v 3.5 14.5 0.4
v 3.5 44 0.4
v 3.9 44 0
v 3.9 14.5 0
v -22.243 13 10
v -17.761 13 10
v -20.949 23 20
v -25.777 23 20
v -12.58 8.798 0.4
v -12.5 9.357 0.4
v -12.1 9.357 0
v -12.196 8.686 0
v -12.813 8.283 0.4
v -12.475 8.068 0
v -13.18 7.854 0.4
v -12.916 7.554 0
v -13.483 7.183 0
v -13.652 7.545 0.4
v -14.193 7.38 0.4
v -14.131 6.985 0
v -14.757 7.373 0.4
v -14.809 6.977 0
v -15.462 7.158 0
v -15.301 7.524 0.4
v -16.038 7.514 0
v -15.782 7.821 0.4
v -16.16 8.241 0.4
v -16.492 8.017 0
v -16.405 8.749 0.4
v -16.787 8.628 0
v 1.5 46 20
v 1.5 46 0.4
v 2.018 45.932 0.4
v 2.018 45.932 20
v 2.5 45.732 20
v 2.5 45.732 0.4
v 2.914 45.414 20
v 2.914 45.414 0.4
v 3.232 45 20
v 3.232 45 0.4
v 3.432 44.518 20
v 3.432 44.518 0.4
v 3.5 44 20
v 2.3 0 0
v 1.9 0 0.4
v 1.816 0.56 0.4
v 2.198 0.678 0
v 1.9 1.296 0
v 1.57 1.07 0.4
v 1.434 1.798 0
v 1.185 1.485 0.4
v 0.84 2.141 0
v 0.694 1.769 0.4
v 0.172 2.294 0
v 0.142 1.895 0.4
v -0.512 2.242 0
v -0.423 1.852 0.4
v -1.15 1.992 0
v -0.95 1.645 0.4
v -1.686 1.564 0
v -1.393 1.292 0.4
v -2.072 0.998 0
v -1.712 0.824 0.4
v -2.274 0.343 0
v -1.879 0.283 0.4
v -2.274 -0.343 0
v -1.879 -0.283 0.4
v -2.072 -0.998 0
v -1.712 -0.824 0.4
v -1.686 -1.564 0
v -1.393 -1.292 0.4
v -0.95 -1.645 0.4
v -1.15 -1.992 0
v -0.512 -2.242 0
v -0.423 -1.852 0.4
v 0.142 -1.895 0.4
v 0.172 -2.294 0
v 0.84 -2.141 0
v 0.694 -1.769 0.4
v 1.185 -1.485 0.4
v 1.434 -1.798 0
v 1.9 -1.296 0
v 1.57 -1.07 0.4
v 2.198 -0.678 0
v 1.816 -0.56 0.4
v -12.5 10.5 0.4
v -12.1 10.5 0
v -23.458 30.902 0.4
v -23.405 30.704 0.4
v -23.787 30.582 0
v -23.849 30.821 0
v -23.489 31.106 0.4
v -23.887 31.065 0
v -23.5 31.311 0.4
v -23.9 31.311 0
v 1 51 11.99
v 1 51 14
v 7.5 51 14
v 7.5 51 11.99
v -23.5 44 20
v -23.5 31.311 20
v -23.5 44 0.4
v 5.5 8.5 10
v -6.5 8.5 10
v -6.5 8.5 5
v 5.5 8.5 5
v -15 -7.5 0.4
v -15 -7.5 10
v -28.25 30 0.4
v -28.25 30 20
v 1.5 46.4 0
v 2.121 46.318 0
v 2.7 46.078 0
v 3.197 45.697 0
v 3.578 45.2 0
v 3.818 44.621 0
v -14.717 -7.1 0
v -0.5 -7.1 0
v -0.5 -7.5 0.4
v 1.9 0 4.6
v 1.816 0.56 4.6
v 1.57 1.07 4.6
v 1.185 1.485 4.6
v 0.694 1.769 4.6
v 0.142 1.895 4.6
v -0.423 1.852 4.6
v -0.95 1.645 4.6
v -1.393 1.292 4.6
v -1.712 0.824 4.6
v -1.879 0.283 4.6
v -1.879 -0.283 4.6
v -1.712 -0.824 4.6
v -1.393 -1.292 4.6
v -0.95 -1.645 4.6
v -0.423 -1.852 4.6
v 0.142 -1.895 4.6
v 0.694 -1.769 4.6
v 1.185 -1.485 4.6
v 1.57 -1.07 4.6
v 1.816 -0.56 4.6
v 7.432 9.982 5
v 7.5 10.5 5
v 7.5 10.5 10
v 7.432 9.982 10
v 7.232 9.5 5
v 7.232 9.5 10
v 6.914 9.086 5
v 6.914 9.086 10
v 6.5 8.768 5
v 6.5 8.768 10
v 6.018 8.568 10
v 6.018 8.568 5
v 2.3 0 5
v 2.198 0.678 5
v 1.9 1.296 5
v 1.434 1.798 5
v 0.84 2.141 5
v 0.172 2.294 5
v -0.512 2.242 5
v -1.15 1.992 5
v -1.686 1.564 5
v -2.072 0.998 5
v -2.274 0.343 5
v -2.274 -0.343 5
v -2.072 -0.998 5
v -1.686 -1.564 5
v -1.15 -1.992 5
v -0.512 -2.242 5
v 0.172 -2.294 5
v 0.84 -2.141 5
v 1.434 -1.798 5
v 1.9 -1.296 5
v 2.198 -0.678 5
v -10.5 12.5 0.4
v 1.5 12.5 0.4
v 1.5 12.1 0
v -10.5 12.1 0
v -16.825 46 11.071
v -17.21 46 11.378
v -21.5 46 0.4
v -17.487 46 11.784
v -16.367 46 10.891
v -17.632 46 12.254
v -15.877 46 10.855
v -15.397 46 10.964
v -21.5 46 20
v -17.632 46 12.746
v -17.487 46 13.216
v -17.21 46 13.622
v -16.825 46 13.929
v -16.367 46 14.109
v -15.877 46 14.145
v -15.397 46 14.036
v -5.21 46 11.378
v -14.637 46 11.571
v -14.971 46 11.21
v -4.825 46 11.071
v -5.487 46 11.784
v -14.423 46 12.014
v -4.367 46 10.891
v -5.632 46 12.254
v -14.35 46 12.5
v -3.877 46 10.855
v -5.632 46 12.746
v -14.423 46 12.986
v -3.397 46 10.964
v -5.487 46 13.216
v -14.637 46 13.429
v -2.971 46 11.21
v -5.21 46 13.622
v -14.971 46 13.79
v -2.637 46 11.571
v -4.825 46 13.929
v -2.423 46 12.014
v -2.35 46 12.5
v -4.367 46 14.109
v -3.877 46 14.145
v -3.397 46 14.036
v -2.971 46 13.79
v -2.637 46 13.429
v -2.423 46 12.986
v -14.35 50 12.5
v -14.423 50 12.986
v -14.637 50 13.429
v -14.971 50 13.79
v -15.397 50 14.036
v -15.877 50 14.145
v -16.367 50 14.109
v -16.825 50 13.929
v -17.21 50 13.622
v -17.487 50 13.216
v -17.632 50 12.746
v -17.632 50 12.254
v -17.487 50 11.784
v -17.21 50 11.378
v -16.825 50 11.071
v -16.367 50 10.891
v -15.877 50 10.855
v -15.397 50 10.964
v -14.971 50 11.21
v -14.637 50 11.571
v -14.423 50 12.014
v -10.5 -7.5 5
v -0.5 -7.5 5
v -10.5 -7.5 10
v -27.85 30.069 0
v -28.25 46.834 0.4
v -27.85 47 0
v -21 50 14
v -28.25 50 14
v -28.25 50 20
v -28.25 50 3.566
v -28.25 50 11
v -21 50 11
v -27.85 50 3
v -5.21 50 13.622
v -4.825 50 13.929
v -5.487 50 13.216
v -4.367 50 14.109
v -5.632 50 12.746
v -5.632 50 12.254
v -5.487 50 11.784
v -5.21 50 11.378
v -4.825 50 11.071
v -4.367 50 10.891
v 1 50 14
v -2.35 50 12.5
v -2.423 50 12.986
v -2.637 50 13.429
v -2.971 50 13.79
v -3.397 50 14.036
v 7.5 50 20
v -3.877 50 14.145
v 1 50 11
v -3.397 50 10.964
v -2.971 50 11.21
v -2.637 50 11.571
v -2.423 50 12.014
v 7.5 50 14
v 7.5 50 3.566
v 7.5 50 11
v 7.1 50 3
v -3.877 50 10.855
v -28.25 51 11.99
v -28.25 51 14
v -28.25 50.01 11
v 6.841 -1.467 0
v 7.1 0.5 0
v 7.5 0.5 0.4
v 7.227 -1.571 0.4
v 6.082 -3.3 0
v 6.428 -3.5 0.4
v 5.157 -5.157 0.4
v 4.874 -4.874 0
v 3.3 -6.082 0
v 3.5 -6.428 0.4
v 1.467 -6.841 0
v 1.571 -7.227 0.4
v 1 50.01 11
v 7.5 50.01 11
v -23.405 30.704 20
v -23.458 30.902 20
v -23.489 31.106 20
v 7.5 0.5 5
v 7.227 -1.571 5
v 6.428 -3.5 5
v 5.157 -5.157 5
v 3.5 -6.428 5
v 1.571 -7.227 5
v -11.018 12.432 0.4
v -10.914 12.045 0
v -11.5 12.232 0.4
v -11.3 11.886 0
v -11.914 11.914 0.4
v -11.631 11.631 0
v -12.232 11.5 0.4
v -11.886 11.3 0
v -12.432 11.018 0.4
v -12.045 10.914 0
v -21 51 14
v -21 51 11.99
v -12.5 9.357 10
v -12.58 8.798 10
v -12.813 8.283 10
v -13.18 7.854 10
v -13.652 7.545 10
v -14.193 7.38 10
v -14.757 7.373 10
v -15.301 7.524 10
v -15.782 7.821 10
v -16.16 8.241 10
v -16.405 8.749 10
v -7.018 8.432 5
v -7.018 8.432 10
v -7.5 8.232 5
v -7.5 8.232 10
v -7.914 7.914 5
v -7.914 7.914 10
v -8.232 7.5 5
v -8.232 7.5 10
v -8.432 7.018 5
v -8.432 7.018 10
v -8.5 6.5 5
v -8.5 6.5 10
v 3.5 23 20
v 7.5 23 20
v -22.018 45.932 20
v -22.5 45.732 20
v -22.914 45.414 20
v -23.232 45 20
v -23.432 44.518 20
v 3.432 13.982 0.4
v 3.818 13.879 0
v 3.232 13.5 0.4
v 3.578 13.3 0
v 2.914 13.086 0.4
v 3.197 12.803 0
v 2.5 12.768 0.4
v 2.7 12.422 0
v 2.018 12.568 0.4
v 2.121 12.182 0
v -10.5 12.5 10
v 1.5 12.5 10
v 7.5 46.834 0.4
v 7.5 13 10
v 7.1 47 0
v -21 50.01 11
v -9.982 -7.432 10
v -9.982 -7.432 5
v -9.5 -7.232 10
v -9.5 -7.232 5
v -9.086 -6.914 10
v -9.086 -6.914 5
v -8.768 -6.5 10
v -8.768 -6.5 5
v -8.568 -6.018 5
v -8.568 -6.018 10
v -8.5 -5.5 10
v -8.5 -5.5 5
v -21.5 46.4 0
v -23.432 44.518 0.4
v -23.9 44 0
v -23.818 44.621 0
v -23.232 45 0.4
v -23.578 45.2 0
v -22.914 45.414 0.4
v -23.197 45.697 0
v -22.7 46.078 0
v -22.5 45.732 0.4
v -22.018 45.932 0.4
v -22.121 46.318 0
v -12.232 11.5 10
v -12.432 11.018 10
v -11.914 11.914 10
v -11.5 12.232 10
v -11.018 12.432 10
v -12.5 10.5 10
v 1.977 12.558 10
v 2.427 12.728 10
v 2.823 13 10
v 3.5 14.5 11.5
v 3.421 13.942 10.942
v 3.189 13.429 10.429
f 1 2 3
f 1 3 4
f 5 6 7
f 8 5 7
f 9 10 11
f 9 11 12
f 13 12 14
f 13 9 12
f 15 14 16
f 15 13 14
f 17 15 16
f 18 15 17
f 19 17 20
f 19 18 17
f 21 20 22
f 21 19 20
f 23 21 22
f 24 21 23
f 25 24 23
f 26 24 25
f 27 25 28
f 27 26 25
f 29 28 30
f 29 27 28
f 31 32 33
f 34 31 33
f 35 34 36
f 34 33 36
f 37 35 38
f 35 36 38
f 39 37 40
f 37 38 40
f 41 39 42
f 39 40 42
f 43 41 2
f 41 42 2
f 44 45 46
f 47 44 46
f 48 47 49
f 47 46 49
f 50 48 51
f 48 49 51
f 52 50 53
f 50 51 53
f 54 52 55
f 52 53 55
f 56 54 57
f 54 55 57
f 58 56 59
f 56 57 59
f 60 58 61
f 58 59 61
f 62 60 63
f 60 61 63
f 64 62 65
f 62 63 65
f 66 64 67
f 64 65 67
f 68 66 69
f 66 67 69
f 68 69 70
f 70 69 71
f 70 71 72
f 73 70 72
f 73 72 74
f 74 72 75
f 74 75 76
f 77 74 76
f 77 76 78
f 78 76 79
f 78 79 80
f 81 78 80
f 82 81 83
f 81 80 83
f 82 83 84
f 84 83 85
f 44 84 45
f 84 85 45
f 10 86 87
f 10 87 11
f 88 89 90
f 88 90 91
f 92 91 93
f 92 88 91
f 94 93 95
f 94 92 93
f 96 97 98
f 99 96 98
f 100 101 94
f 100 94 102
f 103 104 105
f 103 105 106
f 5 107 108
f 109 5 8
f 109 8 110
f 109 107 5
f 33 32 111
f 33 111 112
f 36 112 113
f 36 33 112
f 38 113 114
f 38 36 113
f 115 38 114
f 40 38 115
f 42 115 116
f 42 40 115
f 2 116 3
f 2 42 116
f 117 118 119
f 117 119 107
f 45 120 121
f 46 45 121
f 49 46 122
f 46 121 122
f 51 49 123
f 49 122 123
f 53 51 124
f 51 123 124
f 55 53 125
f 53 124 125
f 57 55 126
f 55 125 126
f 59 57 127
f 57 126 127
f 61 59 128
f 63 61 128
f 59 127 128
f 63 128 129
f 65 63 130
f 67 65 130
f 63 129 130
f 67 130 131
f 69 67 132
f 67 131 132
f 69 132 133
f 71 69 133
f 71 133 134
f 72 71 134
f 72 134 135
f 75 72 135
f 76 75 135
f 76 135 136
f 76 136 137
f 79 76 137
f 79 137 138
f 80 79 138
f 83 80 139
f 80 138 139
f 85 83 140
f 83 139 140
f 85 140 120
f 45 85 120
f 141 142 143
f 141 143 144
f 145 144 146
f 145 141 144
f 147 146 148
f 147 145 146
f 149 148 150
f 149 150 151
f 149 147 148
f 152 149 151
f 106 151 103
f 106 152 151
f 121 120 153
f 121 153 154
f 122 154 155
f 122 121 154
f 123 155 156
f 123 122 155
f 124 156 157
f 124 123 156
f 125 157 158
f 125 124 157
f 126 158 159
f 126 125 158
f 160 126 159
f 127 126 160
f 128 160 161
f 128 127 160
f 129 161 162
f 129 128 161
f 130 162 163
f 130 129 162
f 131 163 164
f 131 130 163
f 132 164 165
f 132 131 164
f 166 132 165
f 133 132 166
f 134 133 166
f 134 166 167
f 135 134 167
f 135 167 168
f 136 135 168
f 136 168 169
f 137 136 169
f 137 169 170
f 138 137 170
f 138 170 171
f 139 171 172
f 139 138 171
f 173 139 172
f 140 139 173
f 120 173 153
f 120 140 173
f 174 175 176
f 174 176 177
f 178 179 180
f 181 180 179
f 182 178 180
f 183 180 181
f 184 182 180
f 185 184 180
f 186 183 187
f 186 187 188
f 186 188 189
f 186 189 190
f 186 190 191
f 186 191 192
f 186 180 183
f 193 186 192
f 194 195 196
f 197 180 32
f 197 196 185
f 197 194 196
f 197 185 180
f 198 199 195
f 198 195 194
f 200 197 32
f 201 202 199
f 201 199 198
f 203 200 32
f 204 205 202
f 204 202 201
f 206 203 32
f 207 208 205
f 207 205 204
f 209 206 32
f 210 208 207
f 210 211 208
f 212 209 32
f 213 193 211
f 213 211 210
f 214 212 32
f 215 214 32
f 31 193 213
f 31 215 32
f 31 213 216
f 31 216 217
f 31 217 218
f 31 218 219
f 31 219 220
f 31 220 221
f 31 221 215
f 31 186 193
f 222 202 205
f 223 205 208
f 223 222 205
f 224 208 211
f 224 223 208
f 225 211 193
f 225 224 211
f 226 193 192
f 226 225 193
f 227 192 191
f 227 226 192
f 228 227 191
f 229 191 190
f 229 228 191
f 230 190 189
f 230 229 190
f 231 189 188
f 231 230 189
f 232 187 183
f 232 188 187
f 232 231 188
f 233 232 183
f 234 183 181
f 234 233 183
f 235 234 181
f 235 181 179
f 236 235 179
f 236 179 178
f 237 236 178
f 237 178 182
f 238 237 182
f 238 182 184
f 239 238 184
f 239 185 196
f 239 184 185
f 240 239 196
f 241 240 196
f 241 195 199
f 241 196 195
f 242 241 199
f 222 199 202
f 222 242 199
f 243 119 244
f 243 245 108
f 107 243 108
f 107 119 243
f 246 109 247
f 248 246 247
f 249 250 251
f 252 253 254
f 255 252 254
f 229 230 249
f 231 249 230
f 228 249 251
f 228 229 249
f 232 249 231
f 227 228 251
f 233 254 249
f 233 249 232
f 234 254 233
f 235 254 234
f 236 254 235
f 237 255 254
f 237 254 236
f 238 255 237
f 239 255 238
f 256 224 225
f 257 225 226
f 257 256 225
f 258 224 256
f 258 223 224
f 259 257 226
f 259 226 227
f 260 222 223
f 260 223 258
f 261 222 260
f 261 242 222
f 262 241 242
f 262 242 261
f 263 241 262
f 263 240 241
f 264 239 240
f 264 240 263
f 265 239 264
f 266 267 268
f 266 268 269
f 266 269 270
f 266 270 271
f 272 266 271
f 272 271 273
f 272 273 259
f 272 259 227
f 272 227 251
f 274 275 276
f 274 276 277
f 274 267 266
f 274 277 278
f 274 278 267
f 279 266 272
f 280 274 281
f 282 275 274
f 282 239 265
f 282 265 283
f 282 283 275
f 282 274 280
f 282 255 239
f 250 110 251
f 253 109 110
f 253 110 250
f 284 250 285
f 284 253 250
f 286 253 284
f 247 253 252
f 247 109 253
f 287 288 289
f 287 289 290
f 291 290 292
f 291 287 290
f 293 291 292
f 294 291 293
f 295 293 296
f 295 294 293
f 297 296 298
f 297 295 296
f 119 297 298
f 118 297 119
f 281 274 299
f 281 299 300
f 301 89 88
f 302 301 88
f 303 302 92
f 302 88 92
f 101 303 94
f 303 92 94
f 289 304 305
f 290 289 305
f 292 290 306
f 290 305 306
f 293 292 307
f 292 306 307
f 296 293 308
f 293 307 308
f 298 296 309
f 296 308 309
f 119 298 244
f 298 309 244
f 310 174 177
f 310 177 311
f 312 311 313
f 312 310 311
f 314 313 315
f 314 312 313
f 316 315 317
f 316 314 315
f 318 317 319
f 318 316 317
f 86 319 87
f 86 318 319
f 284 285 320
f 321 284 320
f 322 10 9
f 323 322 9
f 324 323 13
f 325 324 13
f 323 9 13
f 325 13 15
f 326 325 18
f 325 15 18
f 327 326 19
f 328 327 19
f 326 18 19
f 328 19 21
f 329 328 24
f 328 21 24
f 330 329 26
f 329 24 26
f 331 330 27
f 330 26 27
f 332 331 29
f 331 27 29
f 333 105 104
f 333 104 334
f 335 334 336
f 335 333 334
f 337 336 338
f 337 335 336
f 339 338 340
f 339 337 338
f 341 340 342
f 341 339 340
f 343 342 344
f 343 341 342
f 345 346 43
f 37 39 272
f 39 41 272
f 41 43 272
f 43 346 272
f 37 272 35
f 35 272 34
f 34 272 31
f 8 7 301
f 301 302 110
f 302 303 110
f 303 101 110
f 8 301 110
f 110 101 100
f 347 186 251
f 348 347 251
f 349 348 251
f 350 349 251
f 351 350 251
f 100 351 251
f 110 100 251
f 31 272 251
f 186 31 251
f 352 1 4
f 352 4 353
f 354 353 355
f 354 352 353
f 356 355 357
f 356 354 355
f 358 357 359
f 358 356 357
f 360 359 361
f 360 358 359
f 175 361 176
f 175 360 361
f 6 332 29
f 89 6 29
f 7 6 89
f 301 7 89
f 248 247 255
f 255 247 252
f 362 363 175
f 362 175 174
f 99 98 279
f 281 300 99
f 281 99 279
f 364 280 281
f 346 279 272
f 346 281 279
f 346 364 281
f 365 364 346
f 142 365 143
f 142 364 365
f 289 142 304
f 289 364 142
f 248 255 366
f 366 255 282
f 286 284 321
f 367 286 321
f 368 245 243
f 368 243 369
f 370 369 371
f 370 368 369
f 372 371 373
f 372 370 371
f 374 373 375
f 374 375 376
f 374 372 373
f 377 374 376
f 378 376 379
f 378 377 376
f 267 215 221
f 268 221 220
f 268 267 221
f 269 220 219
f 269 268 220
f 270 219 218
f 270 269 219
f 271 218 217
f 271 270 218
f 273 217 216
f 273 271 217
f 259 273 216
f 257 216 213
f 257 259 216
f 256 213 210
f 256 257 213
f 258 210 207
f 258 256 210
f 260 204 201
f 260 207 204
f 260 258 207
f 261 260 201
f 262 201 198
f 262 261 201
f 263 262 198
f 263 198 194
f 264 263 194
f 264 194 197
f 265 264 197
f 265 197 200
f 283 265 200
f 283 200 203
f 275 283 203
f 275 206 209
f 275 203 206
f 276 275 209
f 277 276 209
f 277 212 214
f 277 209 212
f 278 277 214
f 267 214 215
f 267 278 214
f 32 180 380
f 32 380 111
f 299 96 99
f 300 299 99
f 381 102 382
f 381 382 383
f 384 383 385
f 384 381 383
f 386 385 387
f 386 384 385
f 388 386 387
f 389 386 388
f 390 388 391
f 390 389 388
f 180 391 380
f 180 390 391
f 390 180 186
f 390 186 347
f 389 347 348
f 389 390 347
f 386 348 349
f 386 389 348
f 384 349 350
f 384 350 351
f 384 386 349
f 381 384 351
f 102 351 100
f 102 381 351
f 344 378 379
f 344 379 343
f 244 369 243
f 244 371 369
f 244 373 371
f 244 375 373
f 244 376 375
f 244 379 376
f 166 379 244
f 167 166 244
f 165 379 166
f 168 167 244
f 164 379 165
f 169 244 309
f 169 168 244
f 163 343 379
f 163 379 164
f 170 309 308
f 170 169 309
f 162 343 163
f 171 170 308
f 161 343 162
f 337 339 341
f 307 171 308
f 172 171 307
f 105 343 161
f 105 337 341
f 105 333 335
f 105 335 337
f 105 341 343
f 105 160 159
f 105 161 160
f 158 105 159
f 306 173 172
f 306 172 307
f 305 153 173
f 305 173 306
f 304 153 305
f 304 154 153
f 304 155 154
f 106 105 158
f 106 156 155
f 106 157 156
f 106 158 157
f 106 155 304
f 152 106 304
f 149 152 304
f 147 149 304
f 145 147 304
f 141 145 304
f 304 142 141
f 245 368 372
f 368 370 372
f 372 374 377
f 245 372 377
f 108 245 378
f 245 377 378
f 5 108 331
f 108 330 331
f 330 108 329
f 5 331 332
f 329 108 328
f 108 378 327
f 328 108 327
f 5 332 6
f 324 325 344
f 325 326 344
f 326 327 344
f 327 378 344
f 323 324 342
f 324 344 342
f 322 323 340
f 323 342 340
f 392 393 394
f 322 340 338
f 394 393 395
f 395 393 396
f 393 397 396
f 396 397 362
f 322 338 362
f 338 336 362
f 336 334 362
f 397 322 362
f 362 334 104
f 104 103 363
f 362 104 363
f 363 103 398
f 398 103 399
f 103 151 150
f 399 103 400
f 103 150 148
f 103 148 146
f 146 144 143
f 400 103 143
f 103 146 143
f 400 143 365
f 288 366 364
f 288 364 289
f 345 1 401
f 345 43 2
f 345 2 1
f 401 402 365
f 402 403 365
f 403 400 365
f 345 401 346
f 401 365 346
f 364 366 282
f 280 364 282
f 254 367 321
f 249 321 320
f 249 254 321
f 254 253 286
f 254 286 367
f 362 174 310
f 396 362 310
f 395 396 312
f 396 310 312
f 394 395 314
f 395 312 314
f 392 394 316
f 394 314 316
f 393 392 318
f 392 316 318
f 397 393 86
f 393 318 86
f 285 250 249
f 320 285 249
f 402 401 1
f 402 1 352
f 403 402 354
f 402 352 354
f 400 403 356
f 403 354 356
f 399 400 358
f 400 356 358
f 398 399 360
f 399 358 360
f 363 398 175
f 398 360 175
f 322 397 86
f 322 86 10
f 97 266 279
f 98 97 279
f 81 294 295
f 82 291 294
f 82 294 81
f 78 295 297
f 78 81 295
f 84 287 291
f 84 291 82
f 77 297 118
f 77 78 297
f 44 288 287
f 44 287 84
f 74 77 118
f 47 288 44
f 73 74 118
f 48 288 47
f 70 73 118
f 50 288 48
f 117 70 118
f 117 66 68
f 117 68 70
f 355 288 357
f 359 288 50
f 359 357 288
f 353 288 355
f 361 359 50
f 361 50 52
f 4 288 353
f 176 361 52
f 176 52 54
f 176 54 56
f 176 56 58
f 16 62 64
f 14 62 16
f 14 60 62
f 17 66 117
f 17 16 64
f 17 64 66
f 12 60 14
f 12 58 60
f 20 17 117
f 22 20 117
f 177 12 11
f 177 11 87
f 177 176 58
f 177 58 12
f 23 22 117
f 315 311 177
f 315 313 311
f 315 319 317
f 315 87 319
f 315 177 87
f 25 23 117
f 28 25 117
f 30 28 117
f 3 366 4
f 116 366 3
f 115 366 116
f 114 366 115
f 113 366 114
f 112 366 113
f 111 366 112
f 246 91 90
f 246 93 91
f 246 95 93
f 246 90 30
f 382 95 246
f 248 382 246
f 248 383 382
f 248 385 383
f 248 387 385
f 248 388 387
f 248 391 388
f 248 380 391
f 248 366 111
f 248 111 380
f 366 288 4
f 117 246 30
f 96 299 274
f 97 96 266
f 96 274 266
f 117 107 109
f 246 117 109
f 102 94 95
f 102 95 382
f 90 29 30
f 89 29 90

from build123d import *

# Parameters (mm, degrees)
PAD005_DEPTH                               = 20
SKETCH019_W                                = 17
SKETCH019_H                                = 17
POCKET013_DEPTH                            = 15
FILLET004_R                                = 2
SKETCH020_R                                = 1.9
POCKET014_DEPTH                            = 5
FILLET005_R                                = 8
POCKET015_DEPTH                            = 20.001
FILLET006_R                                = 2
POCKET016_DEPTH                            = 36.251
CHAMFER004013007011015006009007001032_SIZE = 3
SKETCH023_R                                = 1.65
POCKET017_DEPTH                            = 5
SKETCH024_W                                = 6.5
SKETCH024_H                                = 3
SKETCH024_W_2                              = 7.25
PAD006_DEPTH                               = 1
CHAMFER004013007011015006009007001033_SIZE = 0.99
CHAMFER004013007011015006009007001034_SIZE = 0.4


with BuildPart() as part:
    # Sketch018 → Pad005 (new body)
    with BuildSketch(Plane.XY):
        Polygon((-28.25, 50), (7.5, 50), (7.5, -7.5), (-15, -7.5), (-28.25, 30), align=None)
    extrude(amount=PAD005_DEPTH)

    # Sketch019 (on Face7 of Pad005) → Pocket013 (cut)
    with BuildSketch(Plane.XY.offset(20)):
        Rectangle(SKETCH019_W, SKETCH019_H)
    extrude(amount=-POCKET013_DEPTH, mode=Mode.SUBTRACT)

    # Fillet004
    fillet004_edges = [part.edges().sort_by_distance(p)[0] for p in [
        (-8.5, -7.5, 12.5),
        (-8.5, 8.5, 12.5),
        (7.5, 8.5, 12.5),
    ]]
    fillet(fillet004_edges, radius=FILLET004_R)

    # Sketch020 (on Face5 of Fillet004) → Pocket014 (cut)
    with BuildSketch(Plane.XY.offset(5)):
        Circle(SKETCH020_R)
    extrude(amount=-POCKET014_DEPTH, mode=Mode.SUBTRACT)

    # Fillet005
    fillet005_edges = [part.edges().sort_by_distance(p)[0] for p in [
        (7.5, -7.5, 2.5),
    ]]
    fillet(fillet005_edges, radius=FILLET005_R)

    # Sketch021 (on DatumPlane) → Pocket015 (cut, through all)
    with BuildSketch(Plane.XY.offset(20)):
        Polygon((-23.5, 31), (-23.5, 46), (3.5, 46), (3.5, 12.5), (-12.5, 12.5), (-12.5, -3.5), align=None)
    extrude(amount=-POCKET015_DEPTH, mode=Mode.SUBTRACT)

    # Fillet006
    fillet006_edges = [part.edges().sort_by_distance(p)[0] for p in [
        (3.5, 12.5, 10),
        (-12.5, 12.5, 10),
        (-12.5, -3.5, 10),
        (-23.5, 31, 10),
        (3.5, 46, 10),
        (-23.5, 46, 10),
    ]]
    fillet(fillet006_edges, radius=FILLET006_R)

    # Sketch022 (on DatumPlane) → Pocket016 (cut, through all)
    with BuildSketch(Plane.YZ.offset(8)):
        Polygon((-8, 10), (13, 10), (23, 20), (-8, 20), align=None)
    extrude(amount=-POCKET016_DEPTH, mode=Mode.SUBTRACT)

    # Chamfer004013007011015006009007001032
    chamfer004013007011015006009007001032_edges = [part.edges().sort_by_distance(p)[0] for p in [
        (-10.375, 50, 0),
    ]]
    chamfer(chamfer004013007011015006009007001032_edges, length=CHAMFER004013007011015006009007001032_SIZE)

    # Sketch023 (on DatumPlane) → Pocket017 (cut)
    with BuildSketch(Plane.XZ.offset(-50)):
        with Locations((-16, 12.5)):
            Circle(SKETCH023_R)
        with Locations((-4, 12.5)):
            Circle(SKETCH023_R)
    extrude(amount=POCKET017_DEPTH, mode=Mode.SUBTRACT)

    # Sketch024 (on DatumPlane) → Pad006 (join)
    with BuildSketch(Plane.XZ.offset(-50)):
        with Locations((4.25, 12.5)):
            Rectangle(SKETCH024_W, SKETCH024_H)
        with Locations((-24.625, 12.5)):
            Rectangle(SKETCH024_W_2, SKETCH024_H)
    extrude(amount=-PAD006_DEPTH)

    # Chamfer004013007011015006009007001033
    chamfer004013007011015006009007001033_edges = [part.edges().sort_by_distance(p)[0] for p in [
        (4.25, 51, 11),
        (-24.625, 51, 11),
    ]]
    chamfer(chamfer004013007011015006009007001033_edges, length=CHAMFER004013007011015006009007001033_SIZE)

    # Chamfer004013007011015006009007001034
    chamfer004013007011015006009007001034_edges = [part.edges().sort_by_distance(p)[0] for p in [
        (7.5, 23.75, 0),
        (5.156854, -5.156854, 0),
        (-7.75, -7.5, 0),
        (-21.625, 11.25, 0),
        (-28.25, 38.5, 0),
        (-28.25, 48.5, 1.5),
        (7.5, 48.5, 1.5),
        (-14.192573, 7.380348, 0),
        (-11.914214, 11.914214, 0),
        (-12.5, 9.92829, 0),
        (-4.5, 12.5, 0),
        (2.914214, 13.085786, 0),
        (3.5, 29.25, 0),
        (2.914214, 45.414214, 0),
        (-10, 46, 0),
        (-22.914214, 45.414214, 0),
        (-23.5, 37.655562, 0),
        (-19.905489, 19.726305, 0),
        (-23.476231, 31.003698, 0),
        (-1.9, 0, 0),
        (-1.9, 0, 5),
    ]]
    chamfer(chamfer004013007011015006009007001034_edges, length=CHAMFER004013007011015006009007001034_SIZE)


solid = part.part
